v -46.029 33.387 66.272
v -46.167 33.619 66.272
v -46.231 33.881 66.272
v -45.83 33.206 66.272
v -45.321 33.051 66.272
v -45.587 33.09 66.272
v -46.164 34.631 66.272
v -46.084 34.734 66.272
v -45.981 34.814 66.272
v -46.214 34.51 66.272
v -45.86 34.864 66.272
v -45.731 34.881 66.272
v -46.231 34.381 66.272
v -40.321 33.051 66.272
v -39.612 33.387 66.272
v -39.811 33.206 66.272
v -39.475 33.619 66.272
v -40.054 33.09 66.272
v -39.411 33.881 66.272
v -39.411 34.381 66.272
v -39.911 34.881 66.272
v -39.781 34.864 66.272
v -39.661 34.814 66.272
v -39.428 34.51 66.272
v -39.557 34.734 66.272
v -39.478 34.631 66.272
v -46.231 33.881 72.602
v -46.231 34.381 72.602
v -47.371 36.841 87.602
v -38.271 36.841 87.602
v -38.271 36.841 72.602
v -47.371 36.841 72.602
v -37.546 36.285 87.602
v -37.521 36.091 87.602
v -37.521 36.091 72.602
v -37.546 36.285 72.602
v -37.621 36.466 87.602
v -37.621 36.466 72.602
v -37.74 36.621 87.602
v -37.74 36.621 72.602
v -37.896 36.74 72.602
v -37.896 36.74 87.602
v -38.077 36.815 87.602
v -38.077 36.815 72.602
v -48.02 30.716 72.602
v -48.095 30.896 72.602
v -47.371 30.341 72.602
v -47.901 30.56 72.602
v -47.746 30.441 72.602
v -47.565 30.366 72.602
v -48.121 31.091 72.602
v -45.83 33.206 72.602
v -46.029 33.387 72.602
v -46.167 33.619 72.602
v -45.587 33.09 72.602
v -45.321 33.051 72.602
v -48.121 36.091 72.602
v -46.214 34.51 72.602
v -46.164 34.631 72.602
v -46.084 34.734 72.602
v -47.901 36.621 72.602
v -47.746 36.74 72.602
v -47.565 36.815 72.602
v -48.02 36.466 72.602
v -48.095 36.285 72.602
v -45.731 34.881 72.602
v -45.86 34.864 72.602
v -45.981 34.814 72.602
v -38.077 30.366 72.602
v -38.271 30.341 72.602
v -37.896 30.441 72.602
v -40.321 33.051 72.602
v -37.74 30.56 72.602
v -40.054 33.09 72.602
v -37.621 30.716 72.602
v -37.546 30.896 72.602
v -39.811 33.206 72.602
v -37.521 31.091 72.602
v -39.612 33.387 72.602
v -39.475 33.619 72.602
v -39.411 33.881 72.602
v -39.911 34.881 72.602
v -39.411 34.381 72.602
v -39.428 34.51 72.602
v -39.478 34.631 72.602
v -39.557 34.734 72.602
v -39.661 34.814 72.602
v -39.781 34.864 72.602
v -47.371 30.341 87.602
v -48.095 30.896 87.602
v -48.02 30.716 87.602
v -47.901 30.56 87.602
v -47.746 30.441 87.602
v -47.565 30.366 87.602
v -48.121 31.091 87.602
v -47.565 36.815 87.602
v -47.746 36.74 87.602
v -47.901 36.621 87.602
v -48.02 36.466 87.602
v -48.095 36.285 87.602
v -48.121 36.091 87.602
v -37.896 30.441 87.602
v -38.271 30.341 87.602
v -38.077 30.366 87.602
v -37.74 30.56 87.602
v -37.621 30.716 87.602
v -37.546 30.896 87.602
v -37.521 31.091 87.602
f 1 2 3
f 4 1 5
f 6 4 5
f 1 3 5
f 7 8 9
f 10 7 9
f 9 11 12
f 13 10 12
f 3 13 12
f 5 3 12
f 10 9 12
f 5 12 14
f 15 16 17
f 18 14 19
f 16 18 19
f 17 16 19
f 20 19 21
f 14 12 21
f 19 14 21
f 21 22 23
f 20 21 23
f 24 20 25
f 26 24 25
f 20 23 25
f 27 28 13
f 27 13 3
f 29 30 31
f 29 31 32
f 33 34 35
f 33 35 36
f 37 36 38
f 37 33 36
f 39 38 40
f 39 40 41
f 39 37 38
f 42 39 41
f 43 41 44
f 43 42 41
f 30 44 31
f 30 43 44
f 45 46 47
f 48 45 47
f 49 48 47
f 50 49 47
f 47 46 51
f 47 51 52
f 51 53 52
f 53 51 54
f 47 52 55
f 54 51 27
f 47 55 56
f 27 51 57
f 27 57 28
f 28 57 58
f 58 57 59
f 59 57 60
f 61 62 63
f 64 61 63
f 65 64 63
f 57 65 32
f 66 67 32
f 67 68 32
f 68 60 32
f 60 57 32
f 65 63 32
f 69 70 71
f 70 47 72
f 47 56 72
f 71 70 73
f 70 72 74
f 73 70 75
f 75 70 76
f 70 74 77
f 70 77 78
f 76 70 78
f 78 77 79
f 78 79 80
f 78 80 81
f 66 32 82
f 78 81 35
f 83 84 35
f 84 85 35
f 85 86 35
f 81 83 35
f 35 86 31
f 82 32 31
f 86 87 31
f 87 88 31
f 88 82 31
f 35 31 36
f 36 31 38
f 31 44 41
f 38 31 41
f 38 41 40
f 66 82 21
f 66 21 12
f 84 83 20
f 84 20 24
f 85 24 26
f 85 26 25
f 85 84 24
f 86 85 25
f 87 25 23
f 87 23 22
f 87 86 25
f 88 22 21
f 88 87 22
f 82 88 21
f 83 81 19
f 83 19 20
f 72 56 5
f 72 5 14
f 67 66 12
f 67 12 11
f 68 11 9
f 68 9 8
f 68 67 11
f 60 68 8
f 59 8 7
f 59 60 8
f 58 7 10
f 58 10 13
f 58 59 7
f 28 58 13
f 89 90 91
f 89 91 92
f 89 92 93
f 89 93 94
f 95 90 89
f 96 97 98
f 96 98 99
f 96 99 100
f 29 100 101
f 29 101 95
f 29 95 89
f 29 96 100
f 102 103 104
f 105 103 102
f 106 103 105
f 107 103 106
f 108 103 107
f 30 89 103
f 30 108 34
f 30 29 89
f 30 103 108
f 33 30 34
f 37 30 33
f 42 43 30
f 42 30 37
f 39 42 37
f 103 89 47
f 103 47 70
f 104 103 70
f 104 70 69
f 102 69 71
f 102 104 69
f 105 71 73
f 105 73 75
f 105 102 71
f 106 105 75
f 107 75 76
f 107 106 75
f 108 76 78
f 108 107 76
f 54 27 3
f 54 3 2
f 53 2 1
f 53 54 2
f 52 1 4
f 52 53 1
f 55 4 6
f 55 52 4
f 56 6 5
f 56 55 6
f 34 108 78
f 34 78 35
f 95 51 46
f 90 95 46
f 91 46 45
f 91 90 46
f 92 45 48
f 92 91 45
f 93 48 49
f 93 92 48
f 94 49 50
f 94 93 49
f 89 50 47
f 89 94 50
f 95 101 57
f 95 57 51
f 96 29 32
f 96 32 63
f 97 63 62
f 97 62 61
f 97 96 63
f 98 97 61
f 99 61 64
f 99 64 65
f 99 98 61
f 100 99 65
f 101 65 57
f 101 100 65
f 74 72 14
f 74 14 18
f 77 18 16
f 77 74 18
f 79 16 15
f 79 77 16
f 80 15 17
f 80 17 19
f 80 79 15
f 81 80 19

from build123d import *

# Parameters (mm, degrees)
BOSS_EXTRUDE1_DEPTH = 15
BOSS_EXTRUDE2_DEPTH = 6.33


with BuildPart() as part:
    # Sketch1 → Boss-Extrude1 (new body)
    with BuildSketch(Plane(origin=(0, 0, 87.601912264), x_dir=(-1, 0, 0), z_dir=(0, 0, -1))):
        with BuildLine():
            Line((38.270660543, 36.840565439), (47.370660543, 36.840565439))
            ThreePointArc((47.370660543, 36.840565439), (47.900990629, 36.620895525), (48.120660543, 36.090565439))
            Line((48.120660543, 36.090565439), (48.120660543, 31.090565439))
            ThreePointArc((48.120660543, 31.090565439), (47.900990629, 30.560235353), (47.370660543, 30.340565439))
            Line((47.370660543, 30.340565439), (38.270660543, 30.340565439))
            ThreePointArc((38.270660543, 30.340565439), (37.740330458, 30.560235353), (37.520660543, 31.090565439))
            Line((37.520660543, 31.090565439), (37.520660543, 36.090565439))
            ThreePointArc((37.520660543, 36.090565439), (37.740330458, 36.620895525), (38.270660543, 36.840565439))
        make_face()
    extrude(amount=BOSS_EXTRUDE1_DEPTH)

    # Sketch2 → Boss-Extrude2 (add)
    with BuildSketch(Plane(origin=(0, 0, 72.601912264), x_dir=(-1, 0, 0), z_dir=(0, 0, -1))):
        with BuildLine():
            ThreePointArc((40.320660543, 33.050565439), (39.704827774, 33.289230716), (39.410660543, 33.880565439))
            Line((39.410660543, 33.880565439), (39.410660543, 34.380565439))
            ThreePointArc((39.410660543, 34.380565439), (39.557107153, 34.73411883), (39.910660543, 34.880565439))
            Line((39.910660543, 34.880565439), (45.730660543, 34.880565439))
            ThreePointArc((45.730660543, 34.880565439), (46.084213934, 34.73411883), (46.230660543, 34.380565439))
            Line((46.230660543, 34.380565439), (46.230660543, 33.880565439))
            ThreePointArc((46.230660543, 33.880565439), (45.936493313, 33.289230716), (45.320660543, 33.050565439))
            Line((45.320660543, 33.050565439), (40.320660543, 33.050565439))
        make_face()
    extrude(amount=BOSS_EXTRUDE2_DEPTH)


solid = part.part
